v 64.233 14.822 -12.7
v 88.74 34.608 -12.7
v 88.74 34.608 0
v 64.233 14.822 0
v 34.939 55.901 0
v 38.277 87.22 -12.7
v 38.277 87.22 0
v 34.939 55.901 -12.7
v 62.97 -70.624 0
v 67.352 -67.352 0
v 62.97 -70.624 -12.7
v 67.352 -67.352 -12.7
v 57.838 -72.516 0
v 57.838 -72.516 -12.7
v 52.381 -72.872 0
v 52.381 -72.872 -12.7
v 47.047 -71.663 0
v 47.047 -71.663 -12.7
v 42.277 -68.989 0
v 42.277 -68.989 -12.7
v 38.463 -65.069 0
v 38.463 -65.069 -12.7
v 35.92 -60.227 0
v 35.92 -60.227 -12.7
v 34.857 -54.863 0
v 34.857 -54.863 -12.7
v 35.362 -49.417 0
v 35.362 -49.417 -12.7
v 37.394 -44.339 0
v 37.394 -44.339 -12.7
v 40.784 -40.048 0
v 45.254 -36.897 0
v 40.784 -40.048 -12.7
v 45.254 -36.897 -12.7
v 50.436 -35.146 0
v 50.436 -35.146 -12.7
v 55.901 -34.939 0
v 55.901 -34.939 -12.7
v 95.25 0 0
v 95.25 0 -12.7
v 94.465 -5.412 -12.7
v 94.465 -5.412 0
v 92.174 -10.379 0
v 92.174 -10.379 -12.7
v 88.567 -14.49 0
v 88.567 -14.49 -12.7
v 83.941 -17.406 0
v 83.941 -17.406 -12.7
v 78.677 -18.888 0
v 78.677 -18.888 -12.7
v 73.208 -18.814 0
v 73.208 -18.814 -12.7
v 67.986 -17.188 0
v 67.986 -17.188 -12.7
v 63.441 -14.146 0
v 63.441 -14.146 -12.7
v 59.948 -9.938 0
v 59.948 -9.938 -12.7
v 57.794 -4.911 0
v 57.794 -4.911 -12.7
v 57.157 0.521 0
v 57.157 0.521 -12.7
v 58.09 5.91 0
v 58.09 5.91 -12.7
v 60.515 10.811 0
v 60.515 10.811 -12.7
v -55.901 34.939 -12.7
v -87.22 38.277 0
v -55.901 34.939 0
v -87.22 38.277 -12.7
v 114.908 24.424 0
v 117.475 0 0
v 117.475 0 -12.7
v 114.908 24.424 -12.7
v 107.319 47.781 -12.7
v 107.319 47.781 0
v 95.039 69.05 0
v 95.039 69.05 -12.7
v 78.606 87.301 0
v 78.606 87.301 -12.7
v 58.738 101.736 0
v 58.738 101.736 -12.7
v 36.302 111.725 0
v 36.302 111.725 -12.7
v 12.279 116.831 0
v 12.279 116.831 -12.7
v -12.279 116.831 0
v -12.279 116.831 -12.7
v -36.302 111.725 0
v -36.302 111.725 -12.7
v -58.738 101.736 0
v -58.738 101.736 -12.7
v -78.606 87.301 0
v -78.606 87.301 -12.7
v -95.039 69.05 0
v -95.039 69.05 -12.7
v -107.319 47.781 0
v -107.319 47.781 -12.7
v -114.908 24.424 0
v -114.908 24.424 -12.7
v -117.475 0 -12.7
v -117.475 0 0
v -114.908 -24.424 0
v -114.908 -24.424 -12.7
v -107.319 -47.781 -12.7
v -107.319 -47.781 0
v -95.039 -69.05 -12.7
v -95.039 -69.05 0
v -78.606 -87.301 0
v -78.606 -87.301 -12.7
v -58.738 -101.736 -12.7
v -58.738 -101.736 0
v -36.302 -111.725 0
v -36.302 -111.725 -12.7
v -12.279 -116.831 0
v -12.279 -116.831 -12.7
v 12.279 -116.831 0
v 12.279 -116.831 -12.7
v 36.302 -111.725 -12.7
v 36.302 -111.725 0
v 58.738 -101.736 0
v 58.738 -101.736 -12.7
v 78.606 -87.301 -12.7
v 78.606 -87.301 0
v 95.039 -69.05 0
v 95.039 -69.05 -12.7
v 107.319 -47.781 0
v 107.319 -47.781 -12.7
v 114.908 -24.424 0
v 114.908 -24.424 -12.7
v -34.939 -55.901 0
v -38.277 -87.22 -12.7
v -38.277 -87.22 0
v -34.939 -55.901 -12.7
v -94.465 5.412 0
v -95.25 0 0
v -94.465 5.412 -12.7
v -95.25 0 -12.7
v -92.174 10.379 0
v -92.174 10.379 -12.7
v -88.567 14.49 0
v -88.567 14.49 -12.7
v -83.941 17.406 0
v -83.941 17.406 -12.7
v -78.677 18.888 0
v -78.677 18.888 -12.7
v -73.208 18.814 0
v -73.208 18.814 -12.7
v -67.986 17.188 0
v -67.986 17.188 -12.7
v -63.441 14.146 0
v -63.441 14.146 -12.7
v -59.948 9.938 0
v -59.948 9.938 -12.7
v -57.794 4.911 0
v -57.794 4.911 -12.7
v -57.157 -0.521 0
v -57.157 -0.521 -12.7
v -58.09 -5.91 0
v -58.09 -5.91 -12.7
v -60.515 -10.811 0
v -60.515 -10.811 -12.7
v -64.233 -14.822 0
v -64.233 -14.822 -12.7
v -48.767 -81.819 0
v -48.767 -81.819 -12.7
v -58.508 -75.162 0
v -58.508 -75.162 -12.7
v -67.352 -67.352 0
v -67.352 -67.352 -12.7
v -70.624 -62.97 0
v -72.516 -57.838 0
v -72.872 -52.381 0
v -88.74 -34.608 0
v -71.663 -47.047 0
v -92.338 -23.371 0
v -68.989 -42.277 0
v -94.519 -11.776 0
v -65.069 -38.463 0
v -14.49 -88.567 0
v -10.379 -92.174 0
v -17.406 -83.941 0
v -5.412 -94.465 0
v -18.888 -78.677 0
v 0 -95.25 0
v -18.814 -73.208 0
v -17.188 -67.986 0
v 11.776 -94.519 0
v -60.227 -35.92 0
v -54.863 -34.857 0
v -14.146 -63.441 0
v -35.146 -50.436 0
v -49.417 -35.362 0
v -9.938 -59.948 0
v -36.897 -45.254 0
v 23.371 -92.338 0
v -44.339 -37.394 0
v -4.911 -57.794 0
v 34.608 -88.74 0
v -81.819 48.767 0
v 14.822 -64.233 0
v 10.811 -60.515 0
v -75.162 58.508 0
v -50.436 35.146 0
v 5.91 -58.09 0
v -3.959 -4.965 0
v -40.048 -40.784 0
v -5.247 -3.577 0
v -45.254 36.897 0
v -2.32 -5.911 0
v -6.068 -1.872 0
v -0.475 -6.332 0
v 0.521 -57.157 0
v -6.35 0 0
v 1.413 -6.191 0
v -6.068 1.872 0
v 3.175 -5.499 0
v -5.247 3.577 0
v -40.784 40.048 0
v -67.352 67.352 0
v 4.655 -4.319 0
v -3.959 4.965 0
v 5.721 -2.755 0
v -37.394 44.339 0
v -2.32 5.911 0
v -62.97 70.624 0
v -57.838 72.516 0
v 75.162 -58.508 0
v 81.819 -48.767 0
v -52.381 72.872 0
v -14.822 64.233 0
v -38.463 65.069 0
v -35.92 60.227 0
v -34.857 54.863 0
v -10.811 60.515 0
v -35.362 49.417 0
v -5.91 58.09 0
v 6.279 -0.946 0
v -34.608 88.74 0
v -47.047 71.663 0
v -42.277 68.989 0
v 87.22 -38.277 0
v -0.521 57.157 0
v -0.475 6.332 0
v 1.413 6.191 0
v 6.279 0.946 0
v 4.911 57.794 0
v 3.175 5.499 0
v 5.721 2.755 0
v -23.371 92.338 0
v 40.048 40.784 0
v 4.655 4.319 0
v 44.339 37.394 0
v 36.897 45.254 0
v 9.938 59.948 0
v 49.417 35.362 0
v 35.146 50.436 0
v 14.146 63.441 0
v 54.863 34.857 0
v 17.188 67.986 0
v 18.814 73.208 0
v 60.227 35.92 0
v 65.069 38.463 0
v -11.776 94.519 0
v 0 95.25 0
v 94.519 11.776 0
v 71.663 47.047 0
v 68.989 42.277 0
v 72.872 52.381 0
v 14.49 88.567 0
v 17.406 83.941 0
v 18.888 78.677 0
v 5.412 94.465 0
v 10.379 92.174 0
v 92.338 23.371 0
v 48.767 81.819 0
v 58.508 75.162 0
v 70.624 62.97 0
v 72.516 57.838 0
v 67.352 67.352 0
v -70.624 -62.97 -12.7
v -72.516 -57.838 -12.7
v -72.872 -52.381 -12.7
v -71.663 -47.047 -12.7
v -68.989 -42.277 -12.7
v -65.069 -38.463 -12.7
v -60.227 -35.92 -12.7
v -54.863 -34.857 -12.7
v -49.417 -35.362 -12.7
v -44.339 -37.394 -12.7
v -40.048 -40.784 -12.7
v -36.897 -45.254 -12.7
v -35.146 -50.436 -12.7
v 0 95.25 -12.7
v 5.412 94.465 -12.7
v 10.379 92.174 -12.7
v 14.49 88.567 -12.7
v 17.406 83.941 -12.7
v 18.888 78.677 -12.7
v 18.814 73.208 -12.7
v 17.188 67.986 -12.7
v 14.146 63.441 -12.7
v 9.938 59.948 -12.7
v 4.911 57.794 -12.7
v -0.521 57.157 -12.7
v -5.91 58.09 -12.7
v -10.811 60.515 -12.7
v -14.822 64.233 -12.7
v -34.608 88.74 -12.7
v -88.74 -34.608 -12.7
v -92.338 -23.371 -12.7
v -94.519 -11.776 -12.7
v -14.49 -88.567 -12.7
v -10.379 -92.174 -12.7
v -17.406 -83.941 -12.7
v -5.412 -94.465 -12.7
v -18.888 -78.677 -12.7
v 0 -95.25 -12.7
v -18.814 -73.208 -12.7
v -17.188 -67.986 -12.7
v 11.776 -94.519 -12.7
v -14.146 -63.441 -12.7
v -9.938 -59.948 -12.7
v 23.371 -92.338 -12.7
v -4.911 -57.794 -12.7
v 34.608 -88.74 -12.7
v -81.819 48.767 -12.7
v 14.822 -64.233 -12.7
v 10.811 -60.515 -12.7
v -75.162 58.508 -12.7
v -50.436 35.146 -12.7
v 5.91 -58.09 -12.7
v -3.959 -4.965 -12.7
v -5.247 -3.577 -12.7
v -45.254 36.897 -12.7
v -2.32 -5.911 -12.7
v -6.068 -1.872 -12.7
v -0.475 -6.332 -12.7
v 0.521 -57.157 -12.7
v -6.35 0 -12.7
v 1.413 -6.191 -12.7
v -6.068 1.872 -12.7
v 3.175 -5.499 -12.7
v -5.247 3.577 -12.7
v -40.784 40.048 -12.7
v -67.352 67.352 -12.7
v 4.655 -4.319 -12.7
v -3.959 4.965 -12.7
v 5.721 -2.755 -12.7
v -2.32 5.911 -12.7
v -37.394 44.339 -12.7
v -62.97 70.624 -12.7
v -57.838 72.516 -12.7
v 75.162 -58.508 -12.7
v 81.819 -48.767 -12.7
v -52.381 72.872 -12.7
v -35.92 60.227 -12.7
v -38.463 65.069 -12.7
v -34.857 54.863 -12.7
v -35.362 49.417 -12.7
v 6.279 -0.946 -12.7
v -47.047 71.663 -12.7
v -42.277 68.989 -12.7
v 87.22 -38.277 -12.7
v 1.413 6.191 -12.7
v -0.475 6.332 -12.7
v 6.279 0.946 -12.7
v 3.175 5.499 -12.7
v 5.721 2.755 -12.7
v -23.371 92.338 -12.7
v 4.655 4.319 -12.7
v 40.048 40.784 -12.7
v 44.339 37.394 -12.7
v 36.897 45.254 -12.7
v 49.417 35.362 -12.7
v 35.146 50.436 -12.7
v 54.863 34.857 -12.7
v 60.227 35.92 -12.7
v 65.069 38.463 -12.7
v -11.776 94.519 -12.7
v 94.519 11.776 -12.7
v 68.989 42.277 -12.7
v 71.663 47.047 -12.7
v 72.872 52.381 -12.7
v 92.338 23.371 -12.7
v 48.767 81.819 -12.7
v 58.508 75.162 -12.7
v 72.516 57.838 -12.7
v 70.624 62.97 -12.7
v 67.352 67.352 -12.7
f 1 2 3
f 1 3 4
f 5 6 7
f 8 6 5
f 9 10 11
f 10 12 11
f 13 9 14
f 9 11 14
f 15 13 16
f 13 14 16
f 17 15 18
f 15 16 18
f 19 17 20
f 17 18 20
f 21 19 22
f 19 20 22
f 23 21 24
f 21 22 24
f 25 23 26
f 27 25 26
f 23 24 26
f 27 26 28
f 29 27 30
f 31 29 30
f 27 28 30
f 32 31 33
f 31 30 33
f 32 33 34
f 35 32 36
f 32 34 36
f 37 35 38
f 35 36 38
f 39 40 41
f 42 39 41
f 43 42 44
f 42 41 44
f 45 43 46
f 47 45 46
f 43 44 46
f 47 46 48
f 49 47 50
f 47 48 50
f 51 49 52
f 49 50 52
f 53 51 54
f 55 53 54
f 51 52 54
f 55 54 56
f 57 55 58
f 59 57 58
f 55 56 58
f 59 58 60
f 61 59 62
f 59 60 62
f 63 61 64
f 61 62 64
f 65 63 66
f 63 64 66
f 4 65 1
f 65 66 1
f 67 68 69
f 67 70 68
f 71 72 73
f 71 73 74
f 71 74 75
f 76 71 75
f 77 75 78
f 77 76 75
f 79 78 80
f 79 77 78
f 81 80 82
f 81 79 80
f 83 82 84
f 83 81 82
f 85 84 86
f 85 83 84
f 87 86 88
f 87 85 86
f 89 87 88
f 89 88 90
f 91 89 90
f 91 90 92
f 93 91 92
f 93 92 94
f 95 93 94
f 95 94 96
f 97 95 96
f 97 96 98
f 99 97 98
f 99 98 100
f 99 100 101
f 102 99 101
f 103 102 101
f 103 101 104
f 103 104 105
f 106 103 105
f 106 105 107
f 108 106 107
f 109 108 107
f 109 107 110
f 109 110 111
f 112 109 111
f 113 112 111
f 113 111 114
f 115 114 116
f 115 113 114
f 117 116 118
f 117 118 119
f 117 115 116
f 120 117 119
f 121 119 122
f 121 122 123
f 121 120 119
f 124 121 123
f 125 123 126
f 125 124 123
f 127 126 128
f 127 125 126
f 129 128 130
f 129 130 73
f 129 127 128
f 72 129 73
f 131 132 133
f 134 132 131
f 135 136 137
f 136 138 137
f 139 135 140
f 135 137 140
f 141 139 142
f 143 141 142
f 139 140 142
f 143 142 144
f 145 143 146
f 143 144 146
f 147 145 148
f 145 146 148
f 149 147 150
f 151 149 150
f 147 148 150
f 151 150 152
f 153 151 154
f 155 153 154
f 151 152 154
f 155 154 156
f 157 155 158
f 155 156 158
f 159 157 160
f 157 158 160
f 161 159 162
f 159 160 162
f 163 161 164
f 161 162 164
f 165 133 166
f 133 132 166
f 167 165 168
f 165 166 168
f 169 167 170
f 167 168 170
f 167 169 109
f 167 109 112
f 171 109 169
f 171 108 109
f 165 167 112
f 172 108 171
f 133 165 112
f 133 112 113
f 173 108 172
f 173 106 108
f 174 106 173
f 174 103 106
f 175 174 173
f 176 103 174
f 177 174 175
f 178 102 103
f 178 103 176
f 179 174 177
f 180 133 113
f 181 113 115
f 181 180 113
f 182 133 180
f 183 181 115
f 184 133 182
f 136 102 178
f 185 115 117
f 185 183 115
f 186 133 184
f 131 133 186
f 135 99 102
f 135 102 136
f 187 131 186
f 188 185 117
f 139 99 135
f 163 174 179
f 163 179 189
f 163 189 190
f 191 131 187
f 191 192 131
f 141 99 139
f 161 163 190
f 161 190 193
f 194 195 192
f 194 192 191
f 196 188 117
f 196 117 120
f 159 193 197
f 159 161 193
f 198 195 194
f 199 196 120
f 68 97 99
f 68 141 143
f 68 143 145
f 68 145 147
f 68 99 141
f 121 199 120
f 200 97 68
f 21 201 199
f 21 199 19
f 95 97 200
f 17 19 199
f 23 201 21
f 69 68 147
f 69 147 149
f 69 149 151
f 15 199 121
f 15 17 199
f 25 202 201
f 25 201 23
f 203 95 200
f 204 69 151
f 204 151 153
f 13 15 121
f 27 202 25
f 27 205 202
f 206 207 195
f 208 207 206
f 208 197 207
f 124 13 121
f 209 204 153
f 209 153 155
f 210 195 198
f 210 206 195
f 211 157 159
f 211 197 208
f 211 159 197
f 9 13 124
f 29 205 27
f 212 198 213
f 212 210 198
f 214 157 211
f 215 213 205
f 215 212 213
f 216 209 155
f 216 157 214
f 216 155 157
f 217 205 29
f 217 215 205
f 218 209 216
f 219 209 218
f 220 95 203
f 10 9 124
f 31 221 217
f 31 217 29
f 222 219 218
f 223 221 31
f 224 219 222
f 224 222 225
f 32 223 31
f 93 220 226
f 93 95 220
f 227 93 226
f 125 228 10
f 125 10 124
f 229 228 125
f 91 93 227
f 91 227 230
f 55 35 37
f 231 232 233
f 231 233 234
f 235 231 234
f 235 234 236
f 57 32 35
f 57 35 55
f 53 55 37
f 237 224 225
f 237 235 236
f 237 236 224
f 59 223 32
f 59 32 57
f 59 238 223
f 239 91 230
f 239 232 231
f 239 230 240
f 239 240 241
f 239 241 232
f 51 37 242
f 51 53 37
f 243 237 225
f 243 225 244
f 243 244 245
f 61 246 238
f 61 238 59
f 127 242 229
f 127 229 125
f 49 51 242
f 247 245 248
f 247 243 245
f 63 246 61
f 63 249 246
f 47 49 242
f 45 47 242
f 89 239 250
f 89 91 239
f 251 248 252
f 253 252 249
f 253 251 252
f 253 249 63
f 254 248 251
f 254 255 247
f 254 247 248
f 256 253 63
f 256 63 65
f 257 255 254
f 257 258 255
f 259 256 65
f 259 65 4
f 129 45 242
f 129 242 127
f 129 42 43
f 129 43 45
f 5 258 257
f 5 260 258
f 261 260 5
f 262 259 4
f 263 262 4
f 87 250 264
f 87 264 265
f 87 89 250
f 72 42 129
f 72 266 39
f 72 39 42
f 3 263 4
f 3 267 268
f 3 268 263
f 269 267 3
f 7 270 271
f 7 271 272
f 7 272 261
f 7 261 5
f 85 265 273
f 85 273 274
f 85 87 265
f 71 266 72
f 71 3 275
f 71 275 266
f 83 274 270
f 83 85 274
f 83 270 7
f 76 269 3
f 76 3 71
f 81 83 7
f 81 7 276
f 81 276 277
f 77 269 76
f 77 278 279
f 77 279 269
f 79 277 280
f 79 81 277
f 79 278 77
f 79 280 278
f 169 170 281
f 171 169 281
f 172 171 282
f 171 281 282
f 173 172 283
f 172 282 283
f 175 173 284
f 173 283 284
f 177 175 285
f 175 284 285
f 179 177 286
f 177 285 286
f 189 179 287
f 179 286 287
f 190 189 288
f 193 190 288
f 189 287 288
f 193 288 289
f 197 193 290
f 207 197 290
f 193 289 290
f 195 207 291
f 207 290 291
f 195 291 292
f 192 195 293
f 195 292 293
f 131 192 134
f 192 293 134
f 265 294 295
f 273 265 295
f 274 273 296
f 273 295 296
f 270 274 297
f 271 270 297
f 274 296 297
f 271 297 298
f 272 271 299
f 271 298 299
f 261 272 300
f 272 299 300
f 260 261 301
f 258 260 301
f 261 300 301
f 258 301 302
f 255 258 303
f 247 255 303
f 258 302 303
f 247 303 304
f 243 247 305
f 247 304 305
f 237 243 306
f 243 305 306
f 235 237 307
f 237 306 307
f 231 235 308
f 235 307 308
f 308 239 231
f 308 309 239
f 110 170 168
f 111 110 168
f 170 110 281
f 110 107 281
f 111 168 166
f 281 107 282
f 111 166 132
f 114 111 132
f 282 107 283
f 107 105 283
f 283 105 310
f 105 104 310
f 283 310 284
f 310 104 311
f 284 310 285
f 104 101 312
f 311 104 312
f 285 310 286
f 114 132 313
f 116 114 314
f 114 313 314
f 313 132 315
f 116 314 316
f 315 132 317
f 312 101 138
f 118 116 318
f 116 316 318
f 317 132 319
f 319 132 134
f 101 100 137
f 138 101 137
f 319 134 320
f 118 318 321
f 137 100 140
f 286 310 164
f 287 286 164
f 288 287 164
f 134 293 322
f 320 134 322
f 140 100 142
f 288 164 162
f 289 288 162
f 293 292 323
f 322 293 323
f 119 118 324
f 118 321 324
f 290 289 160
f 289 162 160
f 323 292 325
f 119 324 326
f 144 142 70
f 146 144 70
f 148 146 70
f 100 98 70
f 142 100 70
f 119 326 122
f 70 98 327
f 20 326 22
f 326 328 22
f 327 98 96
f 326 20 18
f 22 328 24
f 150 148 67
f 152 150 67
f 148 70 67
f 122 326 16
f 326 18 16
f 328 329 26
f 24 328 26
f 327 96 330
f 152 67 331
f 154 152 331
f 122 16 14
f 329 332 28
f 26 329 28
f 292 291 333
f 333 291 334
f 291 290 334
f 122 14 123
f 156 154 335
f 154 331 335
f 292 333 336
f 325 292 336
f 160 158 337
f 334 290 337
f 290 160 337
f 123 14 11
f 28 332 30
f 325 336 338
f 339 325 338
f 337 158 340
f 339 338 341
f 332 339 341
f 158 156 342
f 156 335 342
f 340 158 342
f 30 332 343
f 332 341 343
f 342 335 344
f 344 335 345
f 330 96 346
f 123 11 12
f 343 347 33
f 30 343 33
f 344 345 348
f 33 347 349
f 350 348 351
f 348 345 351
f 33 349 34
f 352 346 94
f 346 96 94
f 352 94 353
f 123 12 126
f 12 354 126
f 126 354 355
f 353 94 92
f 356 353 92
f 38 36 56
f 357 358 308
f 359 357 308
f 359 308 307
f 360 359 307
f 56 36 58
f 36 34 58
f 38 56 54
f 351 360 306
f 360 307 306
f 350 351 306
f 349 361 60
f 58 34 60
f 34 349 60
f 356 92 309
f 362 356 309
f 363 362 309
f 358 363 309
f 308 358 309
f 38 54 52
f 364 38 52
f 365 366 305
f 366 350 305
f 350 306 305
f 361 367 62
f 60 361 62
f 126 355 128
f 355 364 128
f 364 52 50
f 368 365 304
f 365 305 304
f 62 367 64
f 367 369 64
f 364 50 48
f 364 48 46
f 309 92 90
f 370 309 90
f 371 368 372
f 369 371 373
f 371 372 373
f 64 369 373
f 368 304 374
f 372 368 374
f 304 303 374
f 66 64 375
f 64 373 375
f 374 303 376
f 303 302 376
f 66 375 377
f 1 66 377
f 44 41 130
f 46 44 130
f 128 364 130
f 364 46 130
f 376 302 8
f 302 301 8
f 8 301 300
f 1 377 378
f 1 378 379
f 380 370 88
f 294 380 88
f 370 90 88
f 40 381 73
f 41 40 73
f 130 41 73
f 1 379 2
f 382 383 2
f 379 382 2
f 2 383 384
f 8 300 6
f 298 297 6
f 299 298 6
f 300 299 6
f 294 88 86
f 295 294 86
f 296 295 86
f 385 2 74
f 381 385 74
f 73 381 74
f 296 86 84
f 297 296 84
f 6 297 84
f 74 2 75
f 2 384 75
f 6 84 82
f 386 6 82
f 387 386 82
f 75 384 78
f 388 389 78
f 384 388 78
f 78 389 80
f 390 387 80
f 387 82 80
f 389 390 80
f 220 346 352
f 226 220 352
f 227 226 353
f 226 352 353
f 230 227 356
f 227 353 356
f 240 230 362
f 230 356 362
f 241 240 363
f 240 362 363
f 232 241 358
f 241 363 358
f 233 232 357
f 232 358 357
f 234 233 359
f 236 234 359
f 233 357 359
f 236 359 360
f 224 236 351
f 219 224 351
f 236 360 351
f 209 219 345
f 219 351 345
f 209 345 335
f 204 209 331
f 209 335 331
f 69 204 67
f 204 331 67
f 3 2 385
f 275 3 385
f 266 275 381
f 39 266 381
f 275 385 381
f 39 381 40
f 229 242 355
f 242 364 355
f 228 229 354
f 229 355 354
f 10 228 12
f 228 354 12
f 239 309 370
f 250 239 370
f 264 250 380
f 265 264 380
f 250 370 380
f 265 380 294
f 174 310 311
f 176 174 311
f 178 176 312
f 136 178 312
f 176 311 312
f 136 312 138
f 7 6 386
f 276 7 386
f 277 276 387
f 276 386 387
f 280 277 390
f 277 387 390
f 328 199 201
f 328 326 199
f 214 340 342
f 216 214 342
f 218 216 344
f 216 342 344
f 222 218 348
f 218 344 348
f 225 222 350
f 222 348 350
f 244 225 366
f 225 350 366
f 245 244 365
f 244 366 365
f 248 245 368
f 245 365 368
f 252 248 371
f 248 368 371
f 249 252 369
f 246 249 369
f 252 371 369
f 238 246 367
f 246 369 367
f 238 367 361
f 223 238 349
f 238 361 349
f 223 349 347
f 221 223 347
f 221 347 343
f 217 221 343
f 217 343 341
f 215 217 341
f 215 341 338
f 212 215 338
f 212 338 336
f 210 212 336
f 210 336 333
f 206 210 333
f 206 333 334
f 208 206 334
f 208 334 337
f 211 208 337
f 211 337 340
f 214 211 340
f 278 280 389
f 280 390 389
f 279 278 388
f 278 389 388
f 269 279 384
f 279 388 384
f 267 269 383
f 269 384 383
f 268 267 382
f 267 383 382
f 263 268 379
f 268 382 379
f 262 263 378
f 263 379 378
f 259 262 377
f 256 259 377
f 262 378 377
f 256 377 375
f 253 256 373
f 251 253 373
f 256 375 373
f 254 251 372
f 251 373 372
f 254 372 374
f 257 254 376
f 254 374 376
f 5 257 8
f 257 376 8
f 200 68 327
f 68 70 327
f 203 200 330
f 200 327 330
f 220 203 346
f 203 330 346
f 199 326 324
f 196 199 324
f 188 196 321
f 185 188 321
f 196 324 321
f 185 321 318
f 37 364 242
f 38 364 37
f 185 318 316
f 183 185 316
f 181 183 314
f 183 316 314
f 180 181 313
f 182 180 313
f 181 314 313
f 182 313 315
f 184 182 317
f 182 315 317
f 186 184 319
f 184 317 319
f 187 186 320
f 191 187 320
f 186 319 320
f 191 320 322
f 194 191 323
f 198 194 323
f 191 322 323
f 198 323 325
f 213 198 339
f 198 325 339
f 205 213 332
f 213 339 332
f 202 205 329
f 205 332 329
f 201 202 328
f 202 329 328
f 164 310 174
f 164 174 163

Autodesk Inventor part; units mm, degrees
ref_plane "YZ Plane" through (0, 0, 0) normal (1, 0, 0) x (0, 1, 0)
ref_plane "XZ Plane" through (0, 0, 0) normal (0, 1, 0) x (-1, 0, 0)
ref_plane "XY Plane" through (0, 0, 0) normal (0, 0, 1) x (1, 0, 0)
ref_plane "Work Plane1" through (0, 0, 0) normal (0, 0, 1) x (1, 0, 0)
sketch "Sketch1" plane through (0, 0, 0) normal (0, 0, 1) x (1, 0, 0)
  circle A0 centre (0, 0) radius 117.475 projected
  point P0 (0, 0)
extrude "Extrusion1" add sketch "Sketch1" along normal blind -12.7
sketch "Sketch3" plane through (0, 0, -12.7) normal (0, 0, -1) x (-1, 0, 0)
  circle A0 centre (0, 0) radius 117.475 projected
  circle A1 centre (0, 0) radius 6.35
  circle A2 centre (0, 0) radius 95.25 projected
  circle A3 centre (0, 76.2) radius 19.05
  line L0 (34.6081, 88.7403) -> (14.8223, 64.2332)
  point P0 (0, 95.25)
  dimension "d15" = 12.7
  dimension "d16" = 38.1
extrude "Extrusion5" cut sketch "Sketch3" against normal through all contours A1 | L0 A3 A2 | A3 picked at (25.5173, 87.1725)
pattern_circular "Circular Pattern2" count 8 over 360 about axis through (0, 0, -12.7) along (0, 0, 1) of "Extrusion5"
properties part number "hubSpider" material "Wood (Maple)"
